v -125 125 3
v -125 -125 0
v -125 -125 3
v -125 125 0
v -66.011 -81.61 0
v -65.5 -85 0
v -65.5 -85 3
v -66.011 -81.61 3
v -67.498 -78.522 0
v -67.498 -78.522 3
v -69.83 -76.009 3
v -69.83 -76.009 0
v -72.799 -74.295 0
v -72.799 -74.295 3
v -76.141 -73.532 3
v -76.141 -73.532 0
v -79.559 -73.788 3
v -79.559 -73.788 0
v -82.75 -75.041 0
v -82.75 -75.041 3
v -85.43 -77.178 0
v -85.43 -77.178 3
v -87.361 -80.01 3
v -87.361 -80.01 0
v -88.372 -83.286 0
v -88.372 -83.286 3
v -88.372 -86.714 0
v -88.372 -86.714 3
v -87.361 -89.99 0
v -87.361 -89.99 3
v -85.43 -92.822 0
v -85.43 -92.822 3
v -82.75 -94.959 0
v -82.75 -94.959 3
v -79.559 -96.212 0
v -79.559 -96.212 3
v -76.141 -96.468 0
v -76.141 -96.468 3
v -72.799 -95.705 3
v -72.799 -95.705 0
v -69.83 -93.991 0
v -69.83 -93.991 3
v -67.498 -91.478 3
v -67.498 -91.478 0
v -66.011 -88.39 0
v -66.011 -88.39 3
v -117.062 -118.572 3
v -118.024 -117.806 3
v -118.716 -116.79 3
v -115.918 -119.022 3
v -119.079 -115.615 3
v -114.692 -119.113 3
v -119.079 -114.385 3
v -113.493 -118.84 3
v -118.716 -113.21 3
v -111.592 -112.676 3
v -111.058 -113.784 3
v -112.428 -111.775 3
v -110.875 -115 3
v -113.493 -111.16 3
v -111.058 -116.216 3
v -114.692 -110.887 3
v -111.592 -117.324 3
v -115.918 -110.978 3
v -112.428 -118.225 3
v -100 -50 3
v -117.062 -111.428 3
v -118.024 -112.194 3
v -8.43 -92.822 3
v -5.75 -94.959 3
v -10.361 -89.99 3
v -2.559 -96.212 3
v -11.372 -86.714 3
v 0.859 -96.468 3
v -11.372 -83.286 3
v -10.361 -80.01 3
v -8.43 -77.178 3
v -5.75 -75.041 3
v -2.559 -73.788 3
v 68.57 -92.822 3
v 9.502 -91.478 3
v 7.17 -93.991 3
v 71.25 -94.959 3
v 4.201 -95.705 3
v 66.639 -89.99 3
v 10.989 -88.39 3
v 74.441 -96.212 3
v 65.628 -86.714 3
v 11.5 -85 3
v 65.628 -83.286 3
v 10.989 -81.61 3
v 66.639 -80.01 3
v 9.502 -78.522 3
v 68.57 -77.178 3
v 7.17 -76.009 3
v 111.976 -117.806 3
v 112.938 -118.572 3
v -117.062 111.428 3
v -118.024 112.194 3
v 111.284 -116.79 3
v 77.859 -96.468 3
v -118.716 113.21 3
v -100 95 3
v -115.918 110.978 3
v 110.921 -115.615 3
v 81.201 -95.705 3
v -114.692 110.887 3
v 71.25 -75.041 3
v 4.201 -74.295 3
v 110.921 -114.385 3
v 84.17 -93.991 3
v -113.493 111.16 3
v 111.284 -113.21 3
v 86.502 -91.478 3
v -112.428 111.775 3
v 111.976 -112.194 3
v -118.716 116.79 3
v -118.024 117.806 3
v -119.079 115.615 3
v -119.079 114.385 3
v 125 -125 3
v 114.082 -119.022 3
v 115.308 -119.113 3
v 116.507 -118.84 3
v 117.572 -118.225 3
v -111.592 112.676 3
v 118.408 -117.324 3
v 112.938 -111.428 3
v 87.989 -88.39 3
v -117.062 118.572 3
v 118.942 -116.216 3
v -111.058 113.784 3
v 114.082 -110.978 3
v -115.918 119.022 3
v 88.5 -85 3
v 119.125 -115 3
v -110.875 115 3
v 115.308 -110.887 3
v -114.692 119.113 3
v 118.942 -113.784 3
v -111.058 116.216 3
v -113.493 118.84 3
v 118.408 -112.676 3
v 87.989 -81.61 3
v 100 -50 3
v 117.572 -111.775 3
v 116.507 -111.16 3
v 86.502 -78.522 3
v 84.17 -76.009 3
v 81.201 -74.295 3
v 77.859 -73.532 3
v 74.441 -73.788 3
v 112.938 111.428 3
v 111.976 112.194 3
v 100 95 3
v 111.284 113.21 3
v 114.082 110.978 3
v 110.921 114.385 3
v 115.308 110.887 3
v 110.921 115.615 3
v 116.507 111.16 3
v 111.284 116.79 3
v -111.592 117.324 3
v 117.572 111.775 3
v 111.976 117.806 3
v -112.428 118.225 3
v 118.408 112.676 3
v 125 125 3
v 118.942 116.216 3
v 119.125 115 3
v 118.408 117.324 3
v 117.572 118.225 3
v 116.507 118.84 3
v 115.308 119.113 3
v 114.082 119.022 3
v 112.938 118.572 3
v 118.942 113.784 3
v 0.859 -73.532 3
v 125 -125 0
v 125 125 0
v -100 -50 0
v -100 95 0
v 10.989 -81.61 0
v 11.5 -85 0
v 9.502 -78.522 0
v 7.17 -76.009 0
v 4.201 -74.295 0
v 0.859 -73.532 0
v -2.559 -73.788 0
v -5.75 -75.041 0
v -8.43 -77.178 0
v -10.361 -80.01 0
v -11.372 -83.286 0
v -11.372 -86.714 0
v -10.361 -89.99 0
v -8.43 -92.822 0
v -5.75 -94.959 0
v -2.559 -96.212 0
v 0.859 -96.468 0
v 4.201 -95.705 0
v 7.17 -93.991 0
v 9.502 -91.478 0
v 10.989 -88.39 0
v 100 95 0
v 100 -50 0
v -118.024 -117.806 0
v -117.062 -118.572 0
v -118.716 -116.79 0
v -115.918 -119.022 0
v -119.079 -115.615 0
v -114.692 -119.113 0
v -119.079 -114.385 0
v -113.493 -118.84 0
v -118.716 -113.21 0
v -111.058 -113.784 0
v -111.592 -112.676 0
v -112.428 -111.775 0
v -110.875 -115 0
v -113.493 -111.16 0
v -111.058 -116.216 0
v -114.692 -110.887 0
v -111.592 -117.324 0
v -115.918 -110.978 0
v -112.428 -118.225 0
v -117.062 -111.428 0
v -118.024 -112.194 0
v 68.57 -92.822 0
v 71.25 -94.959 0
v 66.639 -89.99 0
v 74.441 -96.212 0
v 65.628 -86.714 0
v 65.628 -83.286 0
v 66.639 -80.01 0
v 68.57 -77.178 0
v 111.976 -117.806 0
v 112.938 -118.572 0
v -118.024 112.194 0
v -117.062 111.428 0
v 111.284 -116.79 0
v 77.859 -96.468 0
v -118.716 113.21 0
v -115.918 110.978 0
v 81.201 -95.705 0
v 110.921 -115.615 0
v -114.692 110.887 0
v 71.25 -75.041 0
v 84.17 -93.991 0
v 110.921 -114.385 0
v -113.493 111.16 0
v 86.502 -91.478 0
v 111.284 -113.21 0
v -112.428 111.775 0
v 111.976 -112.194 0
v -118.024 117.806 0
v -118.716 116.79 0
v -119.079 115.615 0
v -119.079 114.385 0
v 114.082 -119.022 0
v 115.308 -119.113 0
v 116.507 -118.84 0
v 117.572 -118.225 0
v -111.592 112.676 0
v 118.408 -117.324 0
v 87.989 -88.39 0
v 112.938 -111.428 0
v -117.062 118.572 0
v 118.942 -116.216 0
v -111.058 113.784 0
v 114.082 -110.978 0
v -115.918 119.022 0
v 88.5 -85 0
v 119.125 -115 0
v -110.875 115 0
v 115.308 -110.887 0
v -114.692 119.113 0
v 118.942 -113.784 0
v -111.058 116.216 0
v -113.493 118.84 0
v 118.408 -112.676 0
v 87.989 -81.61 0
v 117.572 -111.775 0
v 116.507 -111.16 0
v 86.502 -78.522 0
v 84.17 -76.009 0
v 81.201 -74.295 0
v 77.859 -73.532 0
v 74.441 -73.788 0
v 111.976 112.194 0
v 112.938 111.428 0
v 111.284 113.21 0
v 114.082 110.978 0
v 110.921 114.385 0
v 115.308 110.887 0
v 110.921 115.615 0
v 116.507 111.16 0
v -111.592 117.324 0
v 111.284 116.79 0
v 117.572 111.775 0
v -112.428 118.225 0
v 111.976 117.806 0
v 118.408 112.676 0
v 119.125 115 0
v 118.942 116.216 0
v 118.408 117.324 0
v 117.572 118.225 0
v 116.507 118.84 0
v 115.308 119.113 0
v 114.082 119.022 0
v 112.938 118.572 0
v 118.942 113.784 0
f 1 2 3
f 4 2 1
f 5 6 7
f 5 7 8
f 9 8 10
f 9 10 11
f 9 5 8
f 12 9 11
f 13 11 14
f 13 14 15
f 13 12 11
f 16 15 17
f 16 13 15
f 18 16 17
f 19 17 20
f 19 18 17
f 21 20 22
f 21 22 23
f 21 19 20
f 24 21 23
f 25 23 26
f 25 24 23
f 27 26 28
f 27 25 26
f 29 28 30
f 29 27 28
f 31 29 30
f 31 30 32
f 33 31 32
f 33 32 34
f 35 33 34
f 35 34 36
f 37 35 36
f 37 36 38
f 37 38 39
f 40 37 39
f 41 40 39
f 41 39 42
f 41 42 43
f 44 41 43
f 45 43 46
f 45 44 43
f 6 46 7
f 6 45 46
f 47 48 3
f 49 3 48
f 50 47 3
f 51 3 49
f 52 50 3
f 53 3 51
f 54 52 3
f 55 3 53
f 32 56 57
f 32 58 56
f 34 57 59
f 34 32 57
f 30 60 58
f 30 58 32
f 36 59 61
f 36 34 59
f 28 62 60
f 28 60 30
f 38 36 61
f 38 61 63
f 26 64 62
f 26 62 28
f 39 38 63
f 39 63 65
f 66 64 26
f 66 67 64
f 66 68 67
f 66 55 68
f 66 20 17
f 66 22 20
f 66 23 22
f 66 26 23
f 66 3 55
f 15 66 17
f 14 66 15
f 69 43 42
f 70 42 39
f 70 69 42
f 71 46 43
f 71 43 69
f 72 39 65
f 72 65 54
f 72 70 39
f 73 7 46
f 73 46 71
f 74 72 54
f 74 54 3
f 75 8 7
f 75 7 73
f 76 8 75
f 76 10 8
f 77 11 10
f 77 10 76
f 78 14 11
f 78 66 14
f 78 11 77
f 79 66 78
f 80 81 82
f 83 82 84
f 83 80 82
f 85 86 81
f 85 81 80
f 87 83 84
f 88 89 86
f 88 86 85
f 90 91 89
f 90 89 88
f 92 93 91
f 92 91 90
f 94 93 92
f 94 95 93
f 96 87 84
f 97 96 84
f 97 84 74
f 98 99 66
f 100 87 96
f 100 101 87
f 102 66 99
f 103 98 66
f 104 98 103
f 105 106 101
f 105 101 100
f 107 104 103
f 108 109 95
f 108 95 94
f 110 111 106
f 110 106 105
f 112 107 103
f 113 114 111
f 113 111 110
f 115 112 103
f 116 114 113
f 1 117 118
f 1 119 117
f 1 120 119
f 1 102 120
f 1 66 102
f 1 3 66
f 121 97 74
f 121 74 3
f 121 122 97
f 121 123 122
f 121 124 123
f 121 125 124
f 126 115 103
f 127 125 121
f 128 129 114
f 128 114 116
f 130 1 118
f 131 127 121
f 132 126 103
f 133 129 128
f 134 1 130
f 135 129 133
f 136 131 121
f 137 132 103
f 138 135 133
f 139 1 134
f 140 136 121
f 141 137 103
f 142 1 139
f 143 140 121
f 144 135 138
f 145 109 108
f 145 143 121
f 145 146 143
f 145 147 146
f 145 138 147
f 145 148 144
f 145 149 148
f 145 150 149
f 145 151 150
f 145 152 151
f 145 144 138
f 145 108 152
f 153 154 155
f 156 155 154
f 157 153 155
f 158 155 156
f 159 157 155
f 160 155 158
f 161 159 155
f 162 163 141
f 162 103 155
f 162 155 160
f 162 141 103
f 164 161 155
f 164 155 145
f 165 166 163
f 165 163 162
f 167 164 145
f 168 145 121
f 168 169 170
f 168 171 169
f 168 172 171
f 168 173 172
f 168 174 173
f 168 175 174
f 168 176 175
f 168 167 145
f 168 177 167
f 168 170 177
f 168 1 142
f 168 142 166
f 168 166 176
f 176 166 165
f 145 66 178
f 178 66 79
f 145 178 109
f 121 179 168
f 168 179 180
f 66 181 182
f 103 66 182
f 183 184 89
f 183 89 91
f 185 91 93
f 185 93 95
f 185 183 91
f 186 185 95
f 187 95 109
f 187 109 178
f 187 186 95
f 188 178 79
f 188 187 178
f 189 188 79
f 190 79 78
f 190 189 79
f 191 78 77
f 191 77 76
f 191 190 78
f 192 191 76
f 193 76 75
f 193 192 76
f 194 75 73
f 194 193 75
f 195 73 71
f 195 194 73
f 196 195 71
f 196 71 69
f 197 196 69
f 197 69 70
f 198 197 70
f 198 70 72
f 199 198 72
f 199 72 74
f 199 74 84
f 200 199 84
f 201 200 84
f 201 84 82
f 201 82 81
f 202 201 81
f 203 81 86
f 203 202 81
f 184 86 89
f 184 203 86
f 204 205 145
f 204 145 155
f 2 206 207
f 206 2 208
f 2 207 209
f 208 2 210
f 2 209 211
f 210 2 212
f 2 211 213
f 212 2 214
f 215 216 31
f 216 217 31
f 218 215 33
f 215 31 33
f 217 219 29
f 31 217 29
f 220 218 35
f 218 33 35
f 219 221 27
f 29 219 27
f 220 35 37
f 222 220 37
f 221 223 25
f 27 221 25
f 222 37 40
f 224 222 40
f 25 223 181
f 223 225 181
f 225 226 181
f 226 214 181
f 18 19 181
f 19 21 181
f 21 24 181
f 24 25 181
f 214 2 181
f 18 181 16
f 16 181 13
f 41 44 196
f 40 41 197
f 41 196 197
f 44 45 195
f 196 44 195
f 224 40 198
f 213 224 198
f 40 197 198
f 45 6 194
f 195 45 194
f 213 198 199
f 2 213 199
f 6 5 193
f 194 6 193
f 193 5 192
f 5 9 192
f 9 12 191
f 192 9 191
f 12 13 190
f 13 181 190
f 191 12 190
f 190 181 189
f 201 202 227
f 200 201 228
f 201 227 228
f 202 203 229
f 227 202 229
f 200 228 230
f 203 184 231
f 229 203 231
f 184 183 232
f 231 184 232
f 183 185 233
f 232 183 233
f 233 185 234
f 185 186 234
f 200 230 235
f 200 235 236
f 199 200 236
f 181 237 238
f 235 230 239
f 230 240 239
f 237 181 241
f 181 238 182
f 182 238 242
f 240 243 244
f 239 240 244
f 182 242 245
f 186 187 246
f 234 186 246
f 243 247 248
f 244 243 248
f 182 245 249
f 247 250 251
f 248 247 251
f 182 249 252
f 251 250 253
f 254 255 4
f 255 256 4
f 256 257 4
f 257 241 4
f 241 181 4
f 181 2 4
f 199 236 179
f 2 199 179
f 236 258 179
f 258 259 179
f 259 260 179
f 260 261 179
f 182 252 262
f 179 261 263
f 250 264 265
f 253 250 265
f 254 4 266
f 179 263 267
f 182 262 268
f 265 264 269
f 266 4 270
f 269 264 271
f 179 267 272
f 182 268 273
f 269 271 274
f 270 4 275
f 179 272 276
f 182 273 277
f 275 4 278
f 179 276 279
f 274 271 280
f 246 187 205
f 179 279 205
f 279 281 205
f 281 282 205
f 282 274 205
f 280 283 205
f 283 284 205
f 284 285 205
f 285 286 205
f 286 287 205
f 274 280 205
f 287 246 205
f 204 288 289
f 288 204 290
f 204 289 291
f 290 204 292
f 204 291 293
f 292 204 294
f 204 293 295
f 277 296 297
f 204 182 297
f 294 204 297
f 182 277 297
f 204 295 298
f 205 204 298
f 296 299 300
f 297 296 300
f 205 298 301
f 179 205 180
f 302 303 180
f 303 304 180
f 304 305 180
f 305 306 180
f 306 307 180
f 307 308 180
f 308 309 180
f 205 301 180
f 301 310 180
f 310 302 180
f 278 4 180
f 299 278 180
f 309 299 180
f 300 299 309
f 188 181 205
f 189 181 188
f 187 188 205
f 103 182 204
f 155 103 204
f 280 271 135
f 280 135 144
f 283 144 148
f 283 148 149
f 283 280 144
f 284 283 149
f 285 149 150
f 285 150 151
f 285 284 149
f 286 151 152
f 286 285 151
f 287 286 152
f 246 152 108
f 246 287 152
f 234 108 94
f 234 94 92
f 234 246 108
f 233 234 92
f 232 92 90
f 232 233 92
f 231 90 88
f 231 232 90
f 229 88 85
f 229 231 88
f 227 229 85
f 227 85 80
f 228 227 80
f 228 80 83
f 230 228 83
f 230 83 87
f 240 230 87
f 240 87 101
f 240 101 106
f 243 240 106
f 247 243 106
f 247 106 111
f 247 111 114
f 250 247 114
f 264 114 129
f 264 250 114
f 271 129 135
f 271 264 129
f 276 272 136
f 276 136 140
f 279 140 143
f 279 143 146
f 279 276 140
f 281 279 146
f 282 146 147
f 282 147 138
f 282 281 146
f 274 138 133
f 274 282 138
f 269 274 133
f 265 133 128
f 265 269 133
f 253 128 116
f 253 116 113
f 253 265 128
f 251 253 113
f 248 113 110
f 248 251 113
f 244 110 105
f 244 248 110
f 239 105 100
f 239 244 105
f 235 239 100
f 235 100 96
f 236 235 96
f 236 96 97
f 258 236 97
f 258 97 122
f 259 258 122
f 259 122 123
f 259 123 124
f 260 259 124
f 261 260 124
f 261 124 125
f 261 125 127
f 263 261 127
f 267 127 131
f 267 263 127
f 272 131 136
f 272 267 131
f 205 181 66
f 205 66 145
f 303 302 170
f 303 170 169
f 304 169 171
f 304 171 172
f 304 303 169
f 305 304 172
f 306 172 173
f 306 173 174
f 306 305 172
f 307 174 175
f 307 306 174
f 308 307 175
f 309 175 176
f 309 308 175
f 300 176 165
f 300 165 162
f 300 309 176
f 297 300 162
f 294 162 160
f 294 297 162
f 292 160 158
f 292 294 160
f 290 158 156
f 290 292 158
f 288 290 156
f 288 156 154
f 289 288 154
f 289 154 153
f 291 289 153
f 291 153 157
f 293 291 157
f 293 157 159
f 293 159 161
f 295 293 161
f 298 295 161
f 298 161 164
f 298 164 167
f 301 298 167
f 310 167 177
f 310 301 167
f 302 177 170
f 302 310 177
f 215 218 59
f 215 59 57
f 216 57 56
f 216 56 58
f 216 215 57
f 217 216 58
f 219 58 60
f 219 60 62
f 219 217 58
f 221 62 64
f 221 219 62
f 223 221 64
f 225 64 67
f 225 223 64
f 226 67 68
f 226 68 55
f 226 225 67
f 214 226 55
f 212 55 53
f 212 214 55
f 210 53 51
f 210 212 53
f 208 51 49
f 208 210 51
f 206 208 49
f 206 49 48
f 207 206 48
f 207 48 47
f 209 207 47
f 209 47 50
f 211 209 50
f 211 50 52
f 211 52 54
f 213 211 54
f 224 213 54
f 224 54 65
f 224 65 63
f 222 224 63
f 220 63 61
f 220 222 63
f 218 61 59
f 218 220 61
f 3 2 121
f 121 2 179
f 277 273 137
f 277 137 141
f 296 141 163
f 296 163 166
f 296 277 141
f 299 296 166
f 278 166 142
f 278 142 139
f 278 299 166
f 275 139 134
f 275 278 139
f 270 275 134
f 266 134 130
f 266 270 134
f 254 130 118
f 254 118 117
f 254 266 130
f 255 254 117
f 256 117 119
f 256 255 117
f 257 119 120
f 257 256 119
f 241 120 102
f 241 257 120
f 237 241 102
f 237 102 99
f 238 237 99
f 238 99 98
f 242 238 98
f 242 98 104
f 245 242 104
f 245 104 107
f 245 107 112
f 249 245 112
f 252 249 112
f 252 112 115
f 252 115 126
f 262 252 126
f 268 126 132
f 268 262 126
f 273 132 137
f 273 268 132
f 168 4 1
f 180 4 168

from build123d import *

# Parameters (mm, degrees)
SKETCH1_W           = 250
SKETCH1_H           = 250
SKETCH1_R           = 4.125
SKETCH1_R_2         = 11.5
SKETCH1_W_2         = 200
SKETCH1_H_2         = 145
BOSS_EXTRUDE1_DEPTH = 3


with BuildPart() as part:
    # Sketch1 → Boss-Extrude1 (new body)
    with BuildSketch(Plane.XY):
        Rectangle(SKETCH1_W, SKETCH1_H)
        with Locations((-115, 115)):
            Circle(SKETCH1_R, mode=Mode.SUBTRACT)
        with Locations((115, 115)):
            Circle(SKETCH1_R, mode=Mode.SUBTRACT)
        with Locations((115, -115)):
            Circle(SKETCH1_R, mode=Mode.SUBTRACT)
        with Locations((-115, -115)):
            Circle(SKETCH1_R, mode=Mode.SUBTRACT)
        with Locations((-77, -85)):
            Circle(SKETCH1_R_2, mode=Mode.SUBTRACT)
        with Locations((0, -85)):
            Circle(SKETCH1_R_2, mode=Mode.SUBTRACT)
        with Locations((77, -85)):
            Circle(SKETCH1_R_2, mode=Mode.SUBTRACT)
        with Locations((0, 22.5)):
            Rectangle(SKETCH1_W_2, SKETCH1_H_2, mode=Mode.SUBTRACT)
    extrude(amount=BOSS_EXTRUDE1_DEPTH)


solid = part.part
